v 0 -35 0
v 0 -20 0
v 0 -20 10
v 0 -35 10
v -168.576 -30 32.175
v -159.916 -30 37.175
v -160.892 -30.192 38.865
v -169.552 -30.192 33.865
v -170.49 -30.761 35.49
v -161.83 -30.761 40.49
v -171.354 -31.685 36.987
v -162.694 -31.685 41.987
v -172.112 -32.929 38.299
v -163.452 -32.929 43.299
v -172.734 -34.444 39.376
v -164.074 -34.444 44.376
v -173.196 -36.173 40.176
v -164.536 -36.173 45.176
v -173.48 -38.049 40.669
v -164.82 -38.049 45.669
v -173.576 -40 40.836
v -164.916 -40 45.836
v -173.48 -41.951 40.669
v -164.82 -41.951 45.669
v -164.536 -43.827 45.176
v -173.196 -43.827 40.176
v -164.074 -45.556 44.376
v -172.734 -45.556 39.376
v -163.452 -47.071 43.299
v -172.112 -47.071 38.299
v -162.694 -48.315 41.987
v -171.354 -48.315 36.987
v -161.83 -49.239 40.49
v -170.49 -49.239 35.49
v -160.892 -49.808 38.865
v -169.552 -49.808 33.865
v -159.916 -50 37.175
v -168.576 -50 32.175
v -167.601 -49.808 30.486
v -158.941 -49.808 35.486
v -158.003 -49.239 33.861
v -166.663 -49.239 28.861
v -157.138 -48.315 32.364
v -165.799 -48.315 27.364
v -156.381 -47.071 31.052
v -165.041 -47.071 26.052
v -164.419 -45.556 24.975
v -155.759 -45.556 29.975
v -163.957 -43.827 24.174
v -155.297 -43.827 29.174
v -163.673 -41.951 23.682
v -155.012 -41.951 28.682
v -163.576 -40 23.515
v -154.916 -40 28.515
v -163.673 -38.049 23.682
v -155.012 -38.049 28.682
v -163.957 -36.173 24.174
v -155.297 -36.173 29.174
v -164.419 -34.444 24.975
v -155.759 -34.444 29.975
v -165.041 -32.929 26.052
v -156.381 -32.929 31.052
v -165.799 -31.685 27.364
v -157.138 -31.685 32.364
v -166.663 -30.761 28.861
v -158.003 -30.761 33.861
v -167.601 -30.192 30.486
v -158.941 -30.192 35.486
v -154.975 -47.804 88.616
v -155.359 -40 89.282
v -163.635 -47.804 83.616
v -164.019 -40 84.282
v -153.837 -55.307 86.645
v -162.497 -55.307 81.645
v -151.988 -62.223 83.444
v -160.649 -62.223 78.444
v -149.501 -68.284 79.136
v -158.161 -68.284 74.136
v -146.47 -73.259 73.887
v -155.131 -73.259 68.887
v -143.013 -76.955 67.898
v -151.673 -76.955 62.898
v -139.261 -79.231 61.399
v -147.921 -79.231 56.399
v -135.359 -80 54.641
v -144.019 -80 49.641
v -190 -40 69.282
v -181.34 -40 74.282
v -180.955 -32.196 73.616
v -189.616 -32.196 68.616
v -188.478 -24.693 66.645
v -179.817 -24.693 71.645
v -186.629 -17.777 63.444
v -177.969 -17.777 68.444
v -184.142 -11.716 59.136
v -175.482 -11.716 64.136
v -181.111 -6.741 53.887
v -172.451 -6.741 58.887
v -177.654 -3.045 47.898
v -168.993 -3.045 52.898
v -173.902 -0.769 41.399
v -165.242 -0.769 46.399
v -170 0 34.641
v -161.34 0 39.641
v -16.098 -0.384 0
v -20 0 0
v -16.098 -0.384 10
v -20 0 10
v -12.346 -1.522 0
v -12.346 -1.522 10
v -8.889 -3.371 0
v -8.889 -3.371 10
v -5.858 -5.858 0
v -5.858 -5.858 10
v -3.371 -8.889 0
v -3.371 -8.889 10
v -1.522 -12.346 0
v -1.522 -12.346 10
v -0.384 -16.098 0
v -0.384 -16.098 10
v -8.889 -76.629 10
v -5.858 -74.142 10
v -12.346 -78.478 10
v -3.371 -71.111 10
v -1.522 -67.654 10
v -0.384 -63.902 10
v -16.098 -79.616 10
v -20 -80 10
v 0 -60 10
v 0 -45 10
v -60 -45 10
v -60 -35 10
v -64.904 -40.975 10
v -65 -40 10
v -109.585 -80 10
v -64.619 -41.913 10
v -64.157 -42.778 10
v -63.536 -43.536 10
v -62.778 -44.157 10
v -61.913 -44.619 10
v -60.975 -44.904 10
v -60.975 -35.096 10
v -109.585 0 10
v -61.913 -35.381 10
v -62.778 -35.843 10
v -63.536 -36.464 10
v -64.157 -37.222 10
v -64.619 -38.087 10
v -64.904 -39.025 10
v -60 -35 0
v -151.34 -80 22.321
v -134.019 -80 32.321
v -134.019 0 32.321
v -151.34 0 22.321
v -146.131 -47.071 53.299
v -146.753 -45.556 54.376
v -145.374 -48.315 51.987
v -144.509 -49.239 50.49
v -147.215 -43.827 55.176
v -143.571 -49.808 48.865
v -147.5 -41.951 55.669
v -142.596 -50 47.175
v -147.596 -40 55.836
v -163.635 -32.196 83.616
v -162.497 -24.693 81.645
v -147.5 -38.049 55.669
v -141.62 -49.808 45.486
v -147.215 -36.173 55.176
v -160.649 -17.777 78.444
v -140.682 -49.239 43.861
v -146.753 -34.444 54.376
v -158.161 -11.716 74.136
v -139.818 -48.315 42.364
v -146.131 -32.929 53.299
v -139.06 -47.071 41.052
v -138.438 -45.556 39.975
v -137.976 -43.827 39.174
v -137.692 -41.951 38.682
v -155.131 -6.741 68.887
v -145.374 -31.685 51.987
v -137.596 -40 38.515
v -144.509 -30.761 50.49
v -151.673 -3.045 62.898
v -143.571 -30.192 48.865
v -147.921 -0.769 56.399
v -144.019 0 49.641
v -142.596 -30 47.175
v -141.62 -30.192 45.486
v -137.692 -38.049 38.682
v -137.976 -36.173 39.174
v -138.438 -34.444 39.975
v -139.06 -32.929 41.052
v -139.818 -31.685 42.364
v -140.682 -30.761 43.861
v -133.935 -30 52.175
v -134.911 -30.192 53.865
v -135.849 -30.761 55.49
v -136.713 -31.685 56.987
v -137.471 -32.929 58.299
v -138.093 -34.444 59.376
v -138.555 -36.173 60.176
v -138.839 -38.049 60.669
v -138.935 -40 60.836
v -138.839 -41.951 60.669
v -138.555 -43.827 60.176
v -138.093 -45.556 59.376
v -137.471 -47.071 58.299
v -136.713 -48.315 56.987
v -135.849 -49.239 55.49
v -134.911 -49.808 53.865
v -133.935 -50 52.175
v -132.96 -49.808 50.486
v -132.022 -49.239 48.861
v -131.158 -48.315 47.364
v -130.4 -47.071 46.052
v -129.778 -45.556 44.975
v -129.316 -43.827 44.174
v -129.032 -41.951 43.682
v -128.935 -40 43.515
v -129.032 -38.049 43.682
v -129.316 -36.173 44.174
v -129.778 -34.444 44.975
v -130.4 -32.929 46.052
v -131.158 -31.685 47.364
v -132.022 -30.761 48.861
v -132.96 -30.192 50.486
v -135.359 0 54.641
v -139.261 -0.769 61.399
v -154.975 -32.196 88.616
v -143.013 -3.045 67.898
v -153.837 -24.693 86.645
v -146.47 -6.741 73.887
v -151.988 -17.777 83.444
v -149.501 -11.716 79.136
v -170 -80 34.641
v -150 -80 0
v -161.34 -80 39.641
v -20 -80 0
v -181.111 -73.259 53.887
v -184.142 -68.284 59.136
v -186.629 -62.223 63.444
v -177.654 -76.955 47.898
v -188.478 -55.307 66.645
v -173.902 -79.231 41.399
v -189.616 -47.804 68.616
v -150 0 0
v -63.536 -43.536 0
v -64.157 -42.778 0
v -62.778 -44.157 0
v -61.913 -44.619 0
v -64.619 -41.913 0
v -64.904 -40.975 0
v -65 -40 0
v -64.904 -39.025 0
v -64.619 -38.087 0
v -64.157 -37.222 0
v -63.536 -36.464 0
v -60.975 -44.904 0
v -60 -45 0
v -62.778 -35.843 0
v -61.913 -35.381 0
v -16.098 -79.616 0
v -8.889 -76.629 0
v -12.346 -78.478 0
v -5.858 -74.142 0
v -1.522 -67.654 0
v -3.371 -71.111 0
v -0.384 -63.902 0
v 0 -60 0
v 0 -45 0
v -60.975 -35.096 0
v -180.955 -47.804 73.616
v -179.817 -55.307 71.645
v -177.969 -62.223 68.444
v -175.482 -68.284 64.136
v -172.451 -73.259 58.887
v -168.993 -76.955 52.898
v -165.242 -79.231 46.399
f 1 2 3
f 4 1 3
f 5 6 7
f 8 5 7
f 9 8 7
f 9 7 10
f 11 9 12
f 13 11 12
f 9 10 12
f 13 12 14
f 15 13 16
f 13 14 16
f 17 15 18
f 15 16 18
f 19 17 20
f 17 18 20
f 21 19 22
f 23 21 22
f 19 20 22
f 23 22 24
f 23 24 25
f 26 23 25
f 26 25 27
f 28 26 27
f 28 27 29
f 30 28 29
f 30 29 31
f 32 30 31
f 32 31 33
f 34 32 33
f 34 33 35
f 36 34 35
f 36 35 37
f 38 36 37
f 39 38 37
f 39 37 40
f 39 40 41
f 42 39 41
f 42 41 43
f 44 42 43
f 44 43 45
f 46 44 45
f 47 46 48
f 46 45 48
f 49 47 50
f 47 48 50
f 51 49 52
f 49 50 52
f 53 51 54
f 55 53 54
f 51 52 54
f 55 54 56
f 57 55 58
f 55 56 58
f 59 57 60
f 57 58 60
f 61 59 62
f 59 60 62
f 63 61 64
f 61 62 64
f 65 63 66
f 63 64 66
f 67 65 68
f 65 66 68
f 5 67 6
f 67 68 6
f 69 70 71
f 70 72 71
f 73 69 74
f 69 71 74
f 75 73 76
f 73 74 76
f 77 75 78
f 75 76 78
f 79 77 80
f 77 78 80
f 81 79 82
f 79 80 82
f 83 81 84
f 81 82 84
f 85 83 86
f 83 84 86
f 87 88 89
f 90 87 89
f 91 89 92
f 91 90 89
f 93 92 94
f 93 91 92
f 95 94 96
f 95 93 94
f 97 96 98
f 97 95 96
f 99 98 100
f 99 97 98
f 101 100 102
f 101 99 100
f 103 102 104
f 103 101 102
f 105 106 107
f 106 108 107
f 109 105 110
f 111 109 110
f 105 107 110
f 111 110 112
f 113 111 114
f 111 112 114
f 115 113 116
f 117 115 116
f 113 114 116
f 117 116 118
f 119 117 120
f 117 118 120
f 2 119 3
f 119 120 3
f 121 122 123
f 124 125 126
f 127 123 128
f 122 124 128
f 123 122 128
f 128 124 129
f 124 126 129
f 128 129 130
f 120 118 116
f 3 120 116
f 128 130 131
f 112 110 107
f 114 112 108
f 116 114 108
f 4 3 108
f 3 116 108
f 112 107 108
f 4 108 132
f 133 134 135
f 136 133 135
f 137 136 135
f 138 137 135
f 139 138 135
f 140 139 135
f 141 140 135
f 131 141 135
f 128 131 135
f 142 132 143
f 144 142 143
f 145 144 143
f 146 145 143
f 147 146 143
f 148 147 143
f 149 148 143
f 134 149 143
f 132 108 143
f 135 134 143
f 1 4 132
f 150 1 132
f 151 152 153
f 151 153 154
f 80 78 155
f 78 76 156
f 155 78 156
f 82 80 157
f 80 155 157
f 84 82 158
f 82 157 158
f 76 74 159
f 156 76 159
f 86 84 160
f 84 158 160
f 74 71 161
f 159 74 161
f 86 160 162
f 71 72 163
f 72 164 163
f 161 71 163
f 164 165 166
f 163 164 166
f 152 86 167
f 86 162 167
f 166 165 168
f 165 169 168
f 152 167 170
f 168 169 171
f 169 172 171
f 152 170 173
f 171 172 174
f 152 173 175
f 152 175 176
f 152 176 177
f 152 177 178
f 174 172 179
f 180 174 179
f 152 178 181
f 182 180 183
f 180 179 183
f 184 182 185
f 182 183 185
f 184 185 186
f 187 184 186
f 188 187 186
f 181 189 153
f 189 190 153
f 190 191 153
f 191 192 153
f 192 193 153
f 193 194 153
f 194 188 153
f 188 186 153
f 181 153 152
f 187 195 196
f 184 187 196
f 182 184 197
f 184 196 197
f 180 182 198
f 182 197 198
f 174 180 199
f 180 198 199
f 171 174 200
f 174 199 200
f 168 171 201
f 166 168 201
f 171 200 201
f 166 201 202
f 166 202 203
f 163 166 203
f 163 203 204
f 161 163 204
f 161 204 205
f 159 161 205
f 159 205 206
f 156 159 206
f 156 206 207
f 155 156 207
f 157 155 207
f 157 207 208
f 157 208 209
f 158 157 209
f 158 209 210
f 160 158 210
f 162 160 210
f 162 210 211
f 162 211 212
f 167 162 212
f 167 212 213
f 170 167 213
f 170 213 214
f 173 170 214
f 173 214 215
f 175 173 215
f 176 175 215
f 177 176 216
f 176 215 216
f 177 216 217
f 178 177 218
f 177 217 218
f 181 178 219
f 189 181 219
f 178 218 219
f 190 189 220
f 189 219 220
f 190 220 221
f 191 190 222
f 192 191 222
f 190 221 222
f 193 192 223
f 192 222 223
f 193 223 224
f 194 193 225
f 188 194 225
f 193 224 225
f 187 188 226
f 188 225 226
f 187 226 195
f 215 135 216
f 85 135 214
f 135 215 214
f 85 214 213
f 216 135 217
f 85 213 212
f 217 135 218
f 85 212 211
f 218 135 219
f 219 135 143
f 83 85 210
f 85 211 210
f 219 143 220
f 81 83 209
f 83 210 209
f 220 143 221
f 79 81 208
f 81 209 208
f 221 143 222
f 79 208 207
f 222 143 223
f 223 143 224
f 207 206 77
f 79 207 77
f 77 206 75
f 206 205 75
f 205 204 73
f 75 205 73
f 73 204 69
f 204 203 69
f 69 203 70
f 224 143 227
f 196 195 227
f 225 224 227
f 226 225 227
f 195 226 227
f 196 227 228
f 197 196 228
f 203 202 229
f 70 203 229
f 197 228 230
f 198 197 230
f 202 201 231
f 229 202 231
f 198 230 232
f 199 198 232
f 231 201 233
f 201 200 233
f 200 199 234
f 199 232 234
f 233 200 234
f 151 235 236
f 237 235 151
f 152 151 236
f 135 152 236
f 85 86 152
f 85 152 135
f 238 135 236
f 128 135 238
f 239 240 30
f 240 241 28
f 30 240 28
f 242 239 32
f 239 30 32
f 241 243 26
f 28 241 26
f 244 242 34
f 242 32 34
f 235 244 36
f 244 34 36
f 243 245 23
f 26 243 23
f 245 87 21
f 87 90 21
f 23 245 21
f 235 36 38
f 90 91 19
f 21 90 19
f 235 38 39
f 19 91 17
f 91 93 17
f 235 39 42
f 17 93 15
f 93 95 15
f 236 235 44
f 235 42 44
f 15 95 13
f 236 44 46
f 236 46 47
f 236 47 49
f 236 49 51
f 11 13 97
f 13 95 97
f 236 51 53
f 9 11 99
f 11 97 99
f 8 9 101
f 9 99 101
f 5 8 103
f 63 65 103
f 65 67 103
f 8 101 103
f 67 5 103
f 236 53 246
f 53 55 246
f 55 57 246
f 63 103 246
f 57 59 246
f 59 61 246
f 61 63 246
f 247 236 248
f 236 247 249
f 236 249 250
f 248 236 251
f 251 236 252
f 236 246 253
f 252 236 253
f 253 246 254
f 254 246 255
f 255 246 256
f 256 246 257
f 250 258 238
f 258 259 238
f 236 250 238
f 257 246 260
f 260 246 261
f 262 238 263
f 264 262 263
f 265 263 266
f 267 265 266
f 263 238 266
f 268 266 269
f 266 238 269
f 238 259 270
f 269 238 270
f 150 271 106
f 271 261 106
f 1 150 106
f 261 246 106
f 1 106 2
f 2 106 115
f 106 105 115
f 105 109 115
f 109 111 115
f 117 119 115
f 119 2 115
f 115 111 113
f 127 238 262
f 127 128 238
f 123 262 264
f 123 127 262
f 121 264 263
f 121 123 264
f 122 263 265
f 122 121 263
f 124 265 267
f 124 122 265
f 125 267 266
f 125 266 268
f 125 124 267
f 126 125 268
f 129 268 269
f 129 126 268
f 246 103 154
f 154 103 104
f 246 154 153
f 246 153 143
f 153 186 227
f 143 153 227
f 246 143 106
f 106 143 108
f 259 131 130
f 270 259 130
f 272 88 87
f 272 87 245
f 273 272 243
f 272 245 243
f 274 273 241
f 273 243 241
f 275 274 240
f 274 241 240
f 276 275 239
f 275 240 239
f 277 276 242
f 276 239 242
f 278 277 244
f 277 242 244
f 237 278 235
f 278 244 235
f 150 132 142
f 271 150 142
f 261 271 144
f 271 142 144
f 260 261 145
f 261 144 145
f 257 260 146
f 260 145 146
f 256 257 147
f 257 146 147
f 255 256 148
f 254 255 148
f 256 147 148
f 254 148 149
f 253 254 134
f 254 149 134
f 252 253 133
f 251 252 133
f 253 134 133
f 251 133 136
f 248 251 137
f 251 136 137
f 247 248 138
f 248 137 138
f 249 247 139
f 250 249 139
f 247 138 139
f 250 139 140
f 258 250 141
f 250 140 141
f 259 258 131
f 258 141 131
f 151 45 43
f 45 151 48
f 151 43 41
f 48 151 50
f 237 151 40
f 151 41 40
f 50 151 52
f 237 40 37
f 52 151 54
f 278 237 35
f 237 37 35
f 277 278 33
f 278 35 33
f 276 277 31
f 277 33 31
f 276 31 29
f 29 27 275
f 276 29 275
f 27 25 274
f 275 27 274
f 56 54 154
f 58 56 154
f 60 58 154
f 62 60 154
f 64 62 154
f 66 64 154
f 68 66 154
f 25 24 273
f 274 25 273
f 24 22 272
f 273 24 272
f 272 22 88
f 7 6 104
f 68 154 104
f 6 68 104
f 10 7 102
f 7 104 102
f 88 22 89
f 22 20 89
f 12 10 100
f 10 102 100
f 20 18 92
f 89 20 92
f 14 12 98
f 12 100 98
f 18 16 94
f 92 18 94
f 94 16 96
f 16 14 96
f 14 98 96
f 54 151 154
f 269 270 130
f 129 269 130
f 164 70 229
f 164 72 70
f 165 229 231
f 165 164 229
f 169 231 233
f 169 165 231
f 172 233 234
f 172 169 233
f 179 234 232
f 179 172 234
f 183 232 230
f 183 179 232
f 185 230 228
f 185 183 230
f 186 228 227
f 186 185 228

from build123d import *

# Parameters (mm, degrees)
F1_DEPTH = 80
F2_R     = 39.99999
F3_R     = 10
F4_DEPTH = 45
F6_DEPTH = 25
F7_R     = 20


# Not quite as in the source:
# - a fillet or chamfer is up to 0.001 mm smaller than in the source, because OpenCascade refuses the exact size


with BuildPart() as f1:
    # F0 (on Front) → F1 (new body)
    with BuildSketch(Plane.XZ):
        Polygon((-150, 0), (0, 0), (0, 10), (-109.5854811567, 10), (-155.3589838486, 89.2820323028), (-164.0192378865, 84.2820323028), (-134.0192378865, 32.3205080757), (-151.3397459622, 22.3205080757), (-181.3397459622, 74.2820323028), (-190, 69.2820323028), align=None)
    extrude(amount=F1_DEPTH)

    # F2 (radius 40 in the source; OpenCascade refuses exactly that, so slightly less here)
    f2_edges = [f1.edges().sort_by_distance(p)[0] for p in [
        (-159.689111, -80, 86.782032),
        (-159.689111, 0, 86.782032),
        (-185.669873, -80, 71.782032),
        (-185.669873, 0, 71.782032),
    ]]
    fillet(f2_edges, radius=F2_R)

    # F3 (on face) → F4 (cut)
    with BuildSketch(Plane(origin=(-77.8589838486, 0, -44.9519052838), x_dir=(0, 1, 0), z_dir=(0.8660254038, 0, 0.5))):
        with Locations((-40, 112.1529946162)):
            Circle(F3_R)
    extrude(amount=-F4_DEPTH, mode=Mode.SUBTRACT)

    # F5 (on face) → F6 (cut)
    with BuildSketch(Plane.XY.offset(10)):
        with BuildLine():
            Line((0, -40), (0, -35))
            Line((0, -35), (-60, -35))
            ThreePointArc((-60, -35), (-56.4644660941, -36.4644660941), (-55, -40))
            Line((-55, -40), (0, -40))
        make_face()
        with BuildLine():
            ThreePointArc((-55, -40), (-56.4644660941, -36.4644660941), (-60, -35))
            ThreePointArc((-60, -35), (-65, -40), (-60, -45))
            ThreePointArc((-60, -45), (-56.4644660941, -43.5355339059), (-55, -40))
        make_face()
        with BuildLine():
            Line((0, -45), (0, -40))
            Line((0, -40), (-55, -40))
            ThreePointArc((-55, -40), (-56.4644660941, -43.5355339059), (-60, -45))
            Line((-60, -45), (0, -45))
        make_face()
    extrude(amount=-F6_DEPTH, mode=Mode.SUBTRACT)

    # F7
    f7_edges = [f1.edges().sort_by_distance(p)[0] for p in [
        (0, -80, 5),
        (0, 0, 5),
    ]]
    fillet(f7_edges, radius=F7_R)


solid = f1.part
